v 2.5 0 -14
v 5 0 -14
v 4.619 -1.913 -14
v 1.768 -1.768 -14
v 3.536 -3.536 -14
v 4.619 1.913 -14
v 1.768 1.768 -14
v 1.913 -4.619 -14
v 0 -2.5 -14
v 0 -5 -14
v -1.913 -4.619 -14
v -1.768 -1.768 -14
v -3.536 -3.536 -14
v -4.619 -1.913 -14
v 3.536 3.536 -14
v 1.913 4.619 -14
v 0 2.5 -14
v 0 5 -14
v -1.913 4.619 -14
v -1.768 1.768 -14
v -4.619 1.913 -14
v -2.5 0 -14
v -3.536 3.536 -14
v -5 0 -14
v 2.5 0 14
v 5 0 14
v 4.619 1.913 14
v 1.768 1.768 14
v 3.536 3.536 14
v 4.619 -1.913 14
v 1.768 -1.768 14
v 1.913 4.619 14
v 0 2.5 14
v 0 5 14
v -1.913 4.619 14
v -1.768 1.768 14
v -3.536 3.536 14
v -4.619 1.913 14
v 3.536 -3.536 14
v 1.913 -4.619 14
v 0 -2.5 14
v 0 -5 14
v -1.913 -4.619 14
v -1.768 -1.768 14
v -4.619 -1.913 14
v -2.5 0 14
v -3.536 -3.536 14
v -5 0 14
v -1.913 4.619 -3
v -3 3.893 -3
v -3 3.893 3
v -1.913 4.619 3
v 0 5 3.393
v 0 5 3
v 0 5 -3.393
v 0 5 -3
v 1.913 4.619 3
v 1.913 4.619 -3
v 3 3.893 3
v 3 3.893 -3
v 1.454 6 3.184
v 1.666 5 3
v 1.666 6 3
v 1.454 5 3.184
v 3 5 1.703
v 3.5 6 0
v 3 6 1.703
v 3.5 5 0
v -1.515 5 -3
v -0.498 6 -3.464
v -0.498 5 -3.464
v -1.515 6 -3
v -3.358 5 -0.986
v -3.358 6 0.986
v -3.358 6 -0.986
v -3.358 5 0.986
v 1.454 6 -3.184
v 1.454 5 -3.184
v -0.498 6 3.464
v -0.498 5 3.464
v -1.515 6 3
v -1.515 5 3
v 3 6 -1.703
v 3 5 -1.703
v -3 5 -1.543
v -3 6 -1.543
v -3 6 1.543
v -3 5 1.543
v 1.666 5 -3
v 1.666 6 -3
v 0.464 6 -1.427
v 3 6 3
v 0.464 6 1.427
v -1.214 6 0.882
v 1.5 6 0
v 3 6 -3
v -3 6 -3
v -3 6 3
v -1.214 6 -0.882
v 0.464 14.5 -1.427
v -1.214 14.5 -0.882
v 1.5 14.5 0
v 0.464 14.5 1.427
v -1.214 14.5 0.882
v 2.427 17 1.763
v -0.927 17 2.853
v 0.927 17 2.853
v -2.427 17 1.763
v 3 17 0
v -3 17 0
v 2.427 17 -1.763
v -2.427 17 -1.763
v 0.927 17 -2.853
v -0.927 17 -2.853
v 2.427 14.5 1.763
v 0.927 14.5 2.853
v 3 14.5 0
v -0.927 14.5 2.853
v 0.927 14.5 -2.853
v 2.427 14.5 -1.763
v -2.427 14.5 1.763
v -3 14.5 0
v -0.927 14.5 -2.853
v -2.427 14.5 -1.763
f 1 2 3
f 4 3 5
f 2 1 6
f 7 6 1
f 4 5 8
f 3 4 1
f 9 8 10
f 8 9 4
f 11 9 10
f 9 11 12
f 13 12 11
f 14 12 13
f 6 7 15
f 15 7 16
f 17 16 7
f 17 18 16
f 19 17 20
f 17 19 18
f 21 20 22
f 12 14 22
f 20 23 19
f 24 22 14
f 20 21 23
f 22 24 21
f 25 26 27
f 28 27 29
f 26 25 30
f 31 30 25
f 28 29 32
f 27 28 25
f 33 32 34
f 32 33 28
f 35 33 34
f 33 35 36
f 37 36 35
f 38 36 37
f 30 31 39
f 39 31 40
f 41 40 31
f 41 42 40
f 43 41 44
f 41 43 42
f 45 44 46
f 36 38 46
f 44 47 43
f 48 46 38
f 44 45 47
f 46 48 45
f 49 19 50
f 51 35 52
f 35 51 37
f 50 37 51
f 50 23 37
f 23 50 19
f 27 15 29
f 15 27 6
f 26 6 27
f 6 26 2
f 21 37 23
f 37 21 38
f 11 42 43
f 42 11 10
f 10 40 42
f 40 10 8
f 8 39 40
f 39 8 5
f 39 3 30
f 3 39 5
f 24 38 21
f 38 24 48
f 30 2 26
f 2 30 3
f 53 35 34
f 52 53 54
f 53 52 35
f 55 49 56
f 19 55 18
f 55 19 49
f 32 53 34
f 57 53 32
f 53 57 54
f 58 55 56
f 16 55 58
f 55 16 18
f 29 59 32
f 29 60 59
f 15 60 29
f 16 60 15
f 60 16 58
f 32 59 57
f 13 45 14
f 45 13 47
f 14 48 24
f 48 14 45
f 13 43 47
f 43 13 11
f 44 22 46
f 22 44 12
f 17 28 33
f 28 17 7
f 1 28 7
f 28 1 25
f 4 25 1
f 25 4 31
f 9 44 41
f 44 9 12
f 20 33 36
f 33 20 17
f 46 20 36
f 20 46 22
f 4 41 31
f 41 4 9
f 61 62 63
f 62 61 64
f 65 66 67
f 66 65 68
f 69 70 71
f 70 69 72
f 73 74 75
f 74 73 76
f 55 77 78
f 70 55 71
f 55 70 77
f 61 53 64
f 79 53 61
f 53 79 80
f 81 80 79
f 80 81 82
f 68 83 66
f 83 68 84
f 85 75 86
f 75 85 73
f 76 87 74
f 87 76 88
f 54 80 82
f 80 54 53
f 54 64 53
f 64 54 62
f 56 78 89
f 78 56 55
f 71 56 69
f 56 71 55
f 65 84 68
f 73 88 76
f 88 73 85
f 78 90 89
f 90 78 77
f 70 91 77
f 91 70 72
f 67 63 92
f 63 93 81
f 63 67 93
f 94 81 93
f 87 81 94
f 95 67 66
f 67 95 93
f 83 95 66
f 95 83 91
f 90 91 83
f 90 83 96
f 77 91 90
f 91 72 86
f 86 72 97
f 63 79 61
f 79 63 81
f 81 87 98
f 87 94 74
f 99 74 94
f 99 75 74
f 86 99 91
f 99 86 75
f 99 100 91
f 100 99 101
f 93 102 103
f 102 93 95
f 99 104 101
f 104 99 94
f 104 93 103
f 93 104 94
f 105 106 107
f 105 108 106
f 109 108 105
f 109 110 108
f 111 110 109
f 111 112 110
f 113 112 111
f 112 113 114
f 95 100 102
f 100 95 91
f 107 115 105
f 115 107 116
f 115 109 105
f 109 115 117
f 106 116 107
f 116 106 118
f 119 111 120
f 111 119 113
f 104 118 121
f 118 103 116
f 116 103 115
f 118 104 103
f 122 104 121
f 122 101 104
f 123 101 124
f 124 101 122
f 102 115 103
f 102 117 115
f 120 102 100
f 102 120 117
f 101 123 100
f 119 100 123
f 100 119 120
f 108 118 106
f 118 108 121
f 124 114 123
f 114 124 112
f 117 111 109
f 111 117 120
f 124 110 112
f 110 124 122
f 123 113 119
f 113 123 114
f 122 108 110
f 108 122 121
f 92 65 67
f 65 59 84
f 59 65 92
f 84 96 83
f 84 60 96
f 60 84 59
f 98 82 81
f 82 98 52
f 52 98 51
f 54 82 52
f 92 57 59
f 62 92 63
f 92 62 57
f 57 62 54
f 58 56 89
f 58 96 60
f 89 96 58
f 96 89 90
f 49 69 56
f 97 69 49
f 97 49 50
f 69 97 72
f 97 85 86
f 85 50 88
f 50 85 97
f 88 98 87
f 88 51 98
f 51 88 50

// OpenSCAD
// Parameters
bore_diameter_mm = 5.0; //[2.5:10.0:0.1]
outer_diameter_mm = 10.0; //[5.0:20.0:0.1]
length_mm = 28.0; //[14.0:56.0:0.5]
bore_radius_mm = 2.5; //[1.25:5.0:0.05]
outer_radius_mm = 5.0; //[2.5:10.0:0.05]
casing_wall_thickness_mm = 1.0; //[0.5:2.0:0.1]
seal_thickness_mm = 1.5; //[0.8:3.0:0.1]
seal_outer_radius_mm = 4.0; //[3.0:5.0:0.1]
seal_inner_clearance_mm = 0.2; //[0.05:0.5:0.05]
overlap_mm = 1.0; //[0.5:2.0:0.1]
bore_extra_length_mm = 2.0; //[1.0:6.0:0.5]
screw_shank_radius_mm = 1.5; //[1.0:2.5:0.1]
screw_length_mm = 12.0; //[6.0:24.0:0.5]
screw_head_radius_mm = 3.0; //[2.0:5.0:0.1]
screw_head_height_mm = 2.5; //[1.5:5.0:0.1]
washer_radius_mm = 3.5; //[2.5:6.0:0.1]
washer_thickness_mm = 1.0; //[0.5:2.0:0.1]
washer_hole_radius_mm = 1.7; //[1.1:3.0:0.1]
screw_mount_pad_thickness_mm = 2.0; //[1.0:4.0:0.1]
screw_mount_pad_width_mm = 6.0; //[3.0:12.0:0.5]
screw_mount_pad_height_mm = 6.0; //[3.0:12.0:0.5]

// LM5LUU Linear Bearing (single connected solid)
module linear_bearing() {
  color([0.85, 0.85, 0.8])
  difference() {
    // UNION all exterior bearing features first, then cut the bore once
    union() {
      // Outer casing
      cylinder(r=outer_radius_mm, h=length_mm, center=true);

      // End seals (slightly overlapping into the casing)
      difference() {
        translate([0, 0, -length_mm/2 + seal_thickness_mm/2 + overlap_mm/2])
          cylinder(r=seal_outer_radius_mm, h=seal_thickness_mm + overlap_mm, center=true);
        translate([0, 0, -length_mm/2 + seal_thickness_mm/2 + overlap_mm/2])
          cylinder(r=bore_radius_mm + seal_inner_clearance_mm, h=seal_thickness_mm + 2*overlap_mm, center=true);
      }

      difference() {
        translate([0, 0,  length_mm/2 - seal_thickness_mm/2 - overlap_mm/2])
          cylinder(r=seal_outer_radius_mm, h=seal_thickness_mm + overlap_mm, center=true);
        translate([0, 0,  length_mm/2 - seal_thickness_mm/2 - overlap_mm/2])
          cylinder(r=bore_radius_mm + seal_inner_clearance_mm, h=seal_thickness_mm + 2*overlap_mm, center=true);
      }
    }

    // Bore through hole (cuts casing + seals)
    cylinder(r=bore_radius_mm, h=length_mm + bore_extra_length_mm, center=true);
  }
}

// Screw and Washer (kept as solid parts; washer hole is cut)
module screw_and_washer() {
  color("DimGray")
  union() {
    // Screw shank (axis along Y)
    rotate([90, 0, 0])
      cylinder(r=screw_shank_radius_mm, h=screw_length_mm, center=true);

    // Screw head (cylindrical head)
    translate([0, screw_length_mm/2 - screw_head_height_mm/2, 0])
      rotate([90, 0, 0])
      cylinder(r=screw_head_radius_mm, h=screw_head_height_mm, center=true);

    // Washer (with hole)
    difference() {
      translate([0, -screw_length_mm/2 + washer_thickness_mm/2, 0])
        rotate([90, 0, 0])
        cylinder(r=washer_radius_mm, h=washer_thickness_mm, center=true);

      translate([0, -screw_length_mm/2 + washer_thickness_mm/2, 0])
        rotate([90, 0, 0])
        cylinder(r=washer_hole_radius_mm, h=washer_thickness_mm + 2*overlap_mm, center=true);
    }
  }
}

// Assembly (ALL parts physically connected + single union)
module assembly() {
  // Ensure the pad intersects the bearing OD by overlap_mm.
  // Bearing extends in Y: [-outer_radius_mm, +outer_radius_mm]
  // Pad extends in Y: [pad_center_y - t/2, pad_center_y + t/2]
  // Set pad inner face at (outer_radius_mm - overlap_mm)
  pad_center_y = (outer_radius_mm - overlap_mm) + screw_mount_pad_thickness_mm/2;

  // Ensure the washer outer face intersects the pad outer face by overlap_mm.
  // Washer outer face (most negative Y of washer) is at: screw_center_y - screw_length_mm/2
  // Pad outer face is at: pad_center_y + t/2
  // Make washer outer face slightly inside pad: washer_outer_face = pad_outer_face - overlap_mm
  screw_center_y = (pad_center_y + screw_mount_pad_thickness_mm/2 - overlap_mm) + screw_length_mm/2;

  // Add a small "boss" that bridges pad -> bearing to guarantee a robust connection
  // even if parameters change (still overlaps both by overlap_mm).
  boss_y = outer_radius_mm - overlap_mm/2; // centered so it intersects bearing and pad
  boss_thickness_y = overlap_mm * 2;       // spans across the interface
  boss_w = screw_mount_pad_width_mm;
  boss_h = screw_mount_pad_height_mm;

  union() {
    // REQUIRED PART: linear bearing (present)
    linear_bearing();

    // Mount pad (connected to bearing)
    translate([0, pad_center_y, 0])
      color("Silver")
      cube([screw_mount_pad_width_mm, screw_mount_pad_thickness_mm, screw_mount_pad_height_mm], center=true);

    // Bridge/boss to guarantee physical attachment between bearing and pad
    translate([0, boss_y, 0])
      color("Silver")
      cube([boss_w, boss_thickness_y, boss_h], center=true);

    // Bolt/shaft + head + washer (connected to pad with overlap)
    translate([0, screw_center_y, 0])
      screw_and_washer();
  }
}

assembly();
